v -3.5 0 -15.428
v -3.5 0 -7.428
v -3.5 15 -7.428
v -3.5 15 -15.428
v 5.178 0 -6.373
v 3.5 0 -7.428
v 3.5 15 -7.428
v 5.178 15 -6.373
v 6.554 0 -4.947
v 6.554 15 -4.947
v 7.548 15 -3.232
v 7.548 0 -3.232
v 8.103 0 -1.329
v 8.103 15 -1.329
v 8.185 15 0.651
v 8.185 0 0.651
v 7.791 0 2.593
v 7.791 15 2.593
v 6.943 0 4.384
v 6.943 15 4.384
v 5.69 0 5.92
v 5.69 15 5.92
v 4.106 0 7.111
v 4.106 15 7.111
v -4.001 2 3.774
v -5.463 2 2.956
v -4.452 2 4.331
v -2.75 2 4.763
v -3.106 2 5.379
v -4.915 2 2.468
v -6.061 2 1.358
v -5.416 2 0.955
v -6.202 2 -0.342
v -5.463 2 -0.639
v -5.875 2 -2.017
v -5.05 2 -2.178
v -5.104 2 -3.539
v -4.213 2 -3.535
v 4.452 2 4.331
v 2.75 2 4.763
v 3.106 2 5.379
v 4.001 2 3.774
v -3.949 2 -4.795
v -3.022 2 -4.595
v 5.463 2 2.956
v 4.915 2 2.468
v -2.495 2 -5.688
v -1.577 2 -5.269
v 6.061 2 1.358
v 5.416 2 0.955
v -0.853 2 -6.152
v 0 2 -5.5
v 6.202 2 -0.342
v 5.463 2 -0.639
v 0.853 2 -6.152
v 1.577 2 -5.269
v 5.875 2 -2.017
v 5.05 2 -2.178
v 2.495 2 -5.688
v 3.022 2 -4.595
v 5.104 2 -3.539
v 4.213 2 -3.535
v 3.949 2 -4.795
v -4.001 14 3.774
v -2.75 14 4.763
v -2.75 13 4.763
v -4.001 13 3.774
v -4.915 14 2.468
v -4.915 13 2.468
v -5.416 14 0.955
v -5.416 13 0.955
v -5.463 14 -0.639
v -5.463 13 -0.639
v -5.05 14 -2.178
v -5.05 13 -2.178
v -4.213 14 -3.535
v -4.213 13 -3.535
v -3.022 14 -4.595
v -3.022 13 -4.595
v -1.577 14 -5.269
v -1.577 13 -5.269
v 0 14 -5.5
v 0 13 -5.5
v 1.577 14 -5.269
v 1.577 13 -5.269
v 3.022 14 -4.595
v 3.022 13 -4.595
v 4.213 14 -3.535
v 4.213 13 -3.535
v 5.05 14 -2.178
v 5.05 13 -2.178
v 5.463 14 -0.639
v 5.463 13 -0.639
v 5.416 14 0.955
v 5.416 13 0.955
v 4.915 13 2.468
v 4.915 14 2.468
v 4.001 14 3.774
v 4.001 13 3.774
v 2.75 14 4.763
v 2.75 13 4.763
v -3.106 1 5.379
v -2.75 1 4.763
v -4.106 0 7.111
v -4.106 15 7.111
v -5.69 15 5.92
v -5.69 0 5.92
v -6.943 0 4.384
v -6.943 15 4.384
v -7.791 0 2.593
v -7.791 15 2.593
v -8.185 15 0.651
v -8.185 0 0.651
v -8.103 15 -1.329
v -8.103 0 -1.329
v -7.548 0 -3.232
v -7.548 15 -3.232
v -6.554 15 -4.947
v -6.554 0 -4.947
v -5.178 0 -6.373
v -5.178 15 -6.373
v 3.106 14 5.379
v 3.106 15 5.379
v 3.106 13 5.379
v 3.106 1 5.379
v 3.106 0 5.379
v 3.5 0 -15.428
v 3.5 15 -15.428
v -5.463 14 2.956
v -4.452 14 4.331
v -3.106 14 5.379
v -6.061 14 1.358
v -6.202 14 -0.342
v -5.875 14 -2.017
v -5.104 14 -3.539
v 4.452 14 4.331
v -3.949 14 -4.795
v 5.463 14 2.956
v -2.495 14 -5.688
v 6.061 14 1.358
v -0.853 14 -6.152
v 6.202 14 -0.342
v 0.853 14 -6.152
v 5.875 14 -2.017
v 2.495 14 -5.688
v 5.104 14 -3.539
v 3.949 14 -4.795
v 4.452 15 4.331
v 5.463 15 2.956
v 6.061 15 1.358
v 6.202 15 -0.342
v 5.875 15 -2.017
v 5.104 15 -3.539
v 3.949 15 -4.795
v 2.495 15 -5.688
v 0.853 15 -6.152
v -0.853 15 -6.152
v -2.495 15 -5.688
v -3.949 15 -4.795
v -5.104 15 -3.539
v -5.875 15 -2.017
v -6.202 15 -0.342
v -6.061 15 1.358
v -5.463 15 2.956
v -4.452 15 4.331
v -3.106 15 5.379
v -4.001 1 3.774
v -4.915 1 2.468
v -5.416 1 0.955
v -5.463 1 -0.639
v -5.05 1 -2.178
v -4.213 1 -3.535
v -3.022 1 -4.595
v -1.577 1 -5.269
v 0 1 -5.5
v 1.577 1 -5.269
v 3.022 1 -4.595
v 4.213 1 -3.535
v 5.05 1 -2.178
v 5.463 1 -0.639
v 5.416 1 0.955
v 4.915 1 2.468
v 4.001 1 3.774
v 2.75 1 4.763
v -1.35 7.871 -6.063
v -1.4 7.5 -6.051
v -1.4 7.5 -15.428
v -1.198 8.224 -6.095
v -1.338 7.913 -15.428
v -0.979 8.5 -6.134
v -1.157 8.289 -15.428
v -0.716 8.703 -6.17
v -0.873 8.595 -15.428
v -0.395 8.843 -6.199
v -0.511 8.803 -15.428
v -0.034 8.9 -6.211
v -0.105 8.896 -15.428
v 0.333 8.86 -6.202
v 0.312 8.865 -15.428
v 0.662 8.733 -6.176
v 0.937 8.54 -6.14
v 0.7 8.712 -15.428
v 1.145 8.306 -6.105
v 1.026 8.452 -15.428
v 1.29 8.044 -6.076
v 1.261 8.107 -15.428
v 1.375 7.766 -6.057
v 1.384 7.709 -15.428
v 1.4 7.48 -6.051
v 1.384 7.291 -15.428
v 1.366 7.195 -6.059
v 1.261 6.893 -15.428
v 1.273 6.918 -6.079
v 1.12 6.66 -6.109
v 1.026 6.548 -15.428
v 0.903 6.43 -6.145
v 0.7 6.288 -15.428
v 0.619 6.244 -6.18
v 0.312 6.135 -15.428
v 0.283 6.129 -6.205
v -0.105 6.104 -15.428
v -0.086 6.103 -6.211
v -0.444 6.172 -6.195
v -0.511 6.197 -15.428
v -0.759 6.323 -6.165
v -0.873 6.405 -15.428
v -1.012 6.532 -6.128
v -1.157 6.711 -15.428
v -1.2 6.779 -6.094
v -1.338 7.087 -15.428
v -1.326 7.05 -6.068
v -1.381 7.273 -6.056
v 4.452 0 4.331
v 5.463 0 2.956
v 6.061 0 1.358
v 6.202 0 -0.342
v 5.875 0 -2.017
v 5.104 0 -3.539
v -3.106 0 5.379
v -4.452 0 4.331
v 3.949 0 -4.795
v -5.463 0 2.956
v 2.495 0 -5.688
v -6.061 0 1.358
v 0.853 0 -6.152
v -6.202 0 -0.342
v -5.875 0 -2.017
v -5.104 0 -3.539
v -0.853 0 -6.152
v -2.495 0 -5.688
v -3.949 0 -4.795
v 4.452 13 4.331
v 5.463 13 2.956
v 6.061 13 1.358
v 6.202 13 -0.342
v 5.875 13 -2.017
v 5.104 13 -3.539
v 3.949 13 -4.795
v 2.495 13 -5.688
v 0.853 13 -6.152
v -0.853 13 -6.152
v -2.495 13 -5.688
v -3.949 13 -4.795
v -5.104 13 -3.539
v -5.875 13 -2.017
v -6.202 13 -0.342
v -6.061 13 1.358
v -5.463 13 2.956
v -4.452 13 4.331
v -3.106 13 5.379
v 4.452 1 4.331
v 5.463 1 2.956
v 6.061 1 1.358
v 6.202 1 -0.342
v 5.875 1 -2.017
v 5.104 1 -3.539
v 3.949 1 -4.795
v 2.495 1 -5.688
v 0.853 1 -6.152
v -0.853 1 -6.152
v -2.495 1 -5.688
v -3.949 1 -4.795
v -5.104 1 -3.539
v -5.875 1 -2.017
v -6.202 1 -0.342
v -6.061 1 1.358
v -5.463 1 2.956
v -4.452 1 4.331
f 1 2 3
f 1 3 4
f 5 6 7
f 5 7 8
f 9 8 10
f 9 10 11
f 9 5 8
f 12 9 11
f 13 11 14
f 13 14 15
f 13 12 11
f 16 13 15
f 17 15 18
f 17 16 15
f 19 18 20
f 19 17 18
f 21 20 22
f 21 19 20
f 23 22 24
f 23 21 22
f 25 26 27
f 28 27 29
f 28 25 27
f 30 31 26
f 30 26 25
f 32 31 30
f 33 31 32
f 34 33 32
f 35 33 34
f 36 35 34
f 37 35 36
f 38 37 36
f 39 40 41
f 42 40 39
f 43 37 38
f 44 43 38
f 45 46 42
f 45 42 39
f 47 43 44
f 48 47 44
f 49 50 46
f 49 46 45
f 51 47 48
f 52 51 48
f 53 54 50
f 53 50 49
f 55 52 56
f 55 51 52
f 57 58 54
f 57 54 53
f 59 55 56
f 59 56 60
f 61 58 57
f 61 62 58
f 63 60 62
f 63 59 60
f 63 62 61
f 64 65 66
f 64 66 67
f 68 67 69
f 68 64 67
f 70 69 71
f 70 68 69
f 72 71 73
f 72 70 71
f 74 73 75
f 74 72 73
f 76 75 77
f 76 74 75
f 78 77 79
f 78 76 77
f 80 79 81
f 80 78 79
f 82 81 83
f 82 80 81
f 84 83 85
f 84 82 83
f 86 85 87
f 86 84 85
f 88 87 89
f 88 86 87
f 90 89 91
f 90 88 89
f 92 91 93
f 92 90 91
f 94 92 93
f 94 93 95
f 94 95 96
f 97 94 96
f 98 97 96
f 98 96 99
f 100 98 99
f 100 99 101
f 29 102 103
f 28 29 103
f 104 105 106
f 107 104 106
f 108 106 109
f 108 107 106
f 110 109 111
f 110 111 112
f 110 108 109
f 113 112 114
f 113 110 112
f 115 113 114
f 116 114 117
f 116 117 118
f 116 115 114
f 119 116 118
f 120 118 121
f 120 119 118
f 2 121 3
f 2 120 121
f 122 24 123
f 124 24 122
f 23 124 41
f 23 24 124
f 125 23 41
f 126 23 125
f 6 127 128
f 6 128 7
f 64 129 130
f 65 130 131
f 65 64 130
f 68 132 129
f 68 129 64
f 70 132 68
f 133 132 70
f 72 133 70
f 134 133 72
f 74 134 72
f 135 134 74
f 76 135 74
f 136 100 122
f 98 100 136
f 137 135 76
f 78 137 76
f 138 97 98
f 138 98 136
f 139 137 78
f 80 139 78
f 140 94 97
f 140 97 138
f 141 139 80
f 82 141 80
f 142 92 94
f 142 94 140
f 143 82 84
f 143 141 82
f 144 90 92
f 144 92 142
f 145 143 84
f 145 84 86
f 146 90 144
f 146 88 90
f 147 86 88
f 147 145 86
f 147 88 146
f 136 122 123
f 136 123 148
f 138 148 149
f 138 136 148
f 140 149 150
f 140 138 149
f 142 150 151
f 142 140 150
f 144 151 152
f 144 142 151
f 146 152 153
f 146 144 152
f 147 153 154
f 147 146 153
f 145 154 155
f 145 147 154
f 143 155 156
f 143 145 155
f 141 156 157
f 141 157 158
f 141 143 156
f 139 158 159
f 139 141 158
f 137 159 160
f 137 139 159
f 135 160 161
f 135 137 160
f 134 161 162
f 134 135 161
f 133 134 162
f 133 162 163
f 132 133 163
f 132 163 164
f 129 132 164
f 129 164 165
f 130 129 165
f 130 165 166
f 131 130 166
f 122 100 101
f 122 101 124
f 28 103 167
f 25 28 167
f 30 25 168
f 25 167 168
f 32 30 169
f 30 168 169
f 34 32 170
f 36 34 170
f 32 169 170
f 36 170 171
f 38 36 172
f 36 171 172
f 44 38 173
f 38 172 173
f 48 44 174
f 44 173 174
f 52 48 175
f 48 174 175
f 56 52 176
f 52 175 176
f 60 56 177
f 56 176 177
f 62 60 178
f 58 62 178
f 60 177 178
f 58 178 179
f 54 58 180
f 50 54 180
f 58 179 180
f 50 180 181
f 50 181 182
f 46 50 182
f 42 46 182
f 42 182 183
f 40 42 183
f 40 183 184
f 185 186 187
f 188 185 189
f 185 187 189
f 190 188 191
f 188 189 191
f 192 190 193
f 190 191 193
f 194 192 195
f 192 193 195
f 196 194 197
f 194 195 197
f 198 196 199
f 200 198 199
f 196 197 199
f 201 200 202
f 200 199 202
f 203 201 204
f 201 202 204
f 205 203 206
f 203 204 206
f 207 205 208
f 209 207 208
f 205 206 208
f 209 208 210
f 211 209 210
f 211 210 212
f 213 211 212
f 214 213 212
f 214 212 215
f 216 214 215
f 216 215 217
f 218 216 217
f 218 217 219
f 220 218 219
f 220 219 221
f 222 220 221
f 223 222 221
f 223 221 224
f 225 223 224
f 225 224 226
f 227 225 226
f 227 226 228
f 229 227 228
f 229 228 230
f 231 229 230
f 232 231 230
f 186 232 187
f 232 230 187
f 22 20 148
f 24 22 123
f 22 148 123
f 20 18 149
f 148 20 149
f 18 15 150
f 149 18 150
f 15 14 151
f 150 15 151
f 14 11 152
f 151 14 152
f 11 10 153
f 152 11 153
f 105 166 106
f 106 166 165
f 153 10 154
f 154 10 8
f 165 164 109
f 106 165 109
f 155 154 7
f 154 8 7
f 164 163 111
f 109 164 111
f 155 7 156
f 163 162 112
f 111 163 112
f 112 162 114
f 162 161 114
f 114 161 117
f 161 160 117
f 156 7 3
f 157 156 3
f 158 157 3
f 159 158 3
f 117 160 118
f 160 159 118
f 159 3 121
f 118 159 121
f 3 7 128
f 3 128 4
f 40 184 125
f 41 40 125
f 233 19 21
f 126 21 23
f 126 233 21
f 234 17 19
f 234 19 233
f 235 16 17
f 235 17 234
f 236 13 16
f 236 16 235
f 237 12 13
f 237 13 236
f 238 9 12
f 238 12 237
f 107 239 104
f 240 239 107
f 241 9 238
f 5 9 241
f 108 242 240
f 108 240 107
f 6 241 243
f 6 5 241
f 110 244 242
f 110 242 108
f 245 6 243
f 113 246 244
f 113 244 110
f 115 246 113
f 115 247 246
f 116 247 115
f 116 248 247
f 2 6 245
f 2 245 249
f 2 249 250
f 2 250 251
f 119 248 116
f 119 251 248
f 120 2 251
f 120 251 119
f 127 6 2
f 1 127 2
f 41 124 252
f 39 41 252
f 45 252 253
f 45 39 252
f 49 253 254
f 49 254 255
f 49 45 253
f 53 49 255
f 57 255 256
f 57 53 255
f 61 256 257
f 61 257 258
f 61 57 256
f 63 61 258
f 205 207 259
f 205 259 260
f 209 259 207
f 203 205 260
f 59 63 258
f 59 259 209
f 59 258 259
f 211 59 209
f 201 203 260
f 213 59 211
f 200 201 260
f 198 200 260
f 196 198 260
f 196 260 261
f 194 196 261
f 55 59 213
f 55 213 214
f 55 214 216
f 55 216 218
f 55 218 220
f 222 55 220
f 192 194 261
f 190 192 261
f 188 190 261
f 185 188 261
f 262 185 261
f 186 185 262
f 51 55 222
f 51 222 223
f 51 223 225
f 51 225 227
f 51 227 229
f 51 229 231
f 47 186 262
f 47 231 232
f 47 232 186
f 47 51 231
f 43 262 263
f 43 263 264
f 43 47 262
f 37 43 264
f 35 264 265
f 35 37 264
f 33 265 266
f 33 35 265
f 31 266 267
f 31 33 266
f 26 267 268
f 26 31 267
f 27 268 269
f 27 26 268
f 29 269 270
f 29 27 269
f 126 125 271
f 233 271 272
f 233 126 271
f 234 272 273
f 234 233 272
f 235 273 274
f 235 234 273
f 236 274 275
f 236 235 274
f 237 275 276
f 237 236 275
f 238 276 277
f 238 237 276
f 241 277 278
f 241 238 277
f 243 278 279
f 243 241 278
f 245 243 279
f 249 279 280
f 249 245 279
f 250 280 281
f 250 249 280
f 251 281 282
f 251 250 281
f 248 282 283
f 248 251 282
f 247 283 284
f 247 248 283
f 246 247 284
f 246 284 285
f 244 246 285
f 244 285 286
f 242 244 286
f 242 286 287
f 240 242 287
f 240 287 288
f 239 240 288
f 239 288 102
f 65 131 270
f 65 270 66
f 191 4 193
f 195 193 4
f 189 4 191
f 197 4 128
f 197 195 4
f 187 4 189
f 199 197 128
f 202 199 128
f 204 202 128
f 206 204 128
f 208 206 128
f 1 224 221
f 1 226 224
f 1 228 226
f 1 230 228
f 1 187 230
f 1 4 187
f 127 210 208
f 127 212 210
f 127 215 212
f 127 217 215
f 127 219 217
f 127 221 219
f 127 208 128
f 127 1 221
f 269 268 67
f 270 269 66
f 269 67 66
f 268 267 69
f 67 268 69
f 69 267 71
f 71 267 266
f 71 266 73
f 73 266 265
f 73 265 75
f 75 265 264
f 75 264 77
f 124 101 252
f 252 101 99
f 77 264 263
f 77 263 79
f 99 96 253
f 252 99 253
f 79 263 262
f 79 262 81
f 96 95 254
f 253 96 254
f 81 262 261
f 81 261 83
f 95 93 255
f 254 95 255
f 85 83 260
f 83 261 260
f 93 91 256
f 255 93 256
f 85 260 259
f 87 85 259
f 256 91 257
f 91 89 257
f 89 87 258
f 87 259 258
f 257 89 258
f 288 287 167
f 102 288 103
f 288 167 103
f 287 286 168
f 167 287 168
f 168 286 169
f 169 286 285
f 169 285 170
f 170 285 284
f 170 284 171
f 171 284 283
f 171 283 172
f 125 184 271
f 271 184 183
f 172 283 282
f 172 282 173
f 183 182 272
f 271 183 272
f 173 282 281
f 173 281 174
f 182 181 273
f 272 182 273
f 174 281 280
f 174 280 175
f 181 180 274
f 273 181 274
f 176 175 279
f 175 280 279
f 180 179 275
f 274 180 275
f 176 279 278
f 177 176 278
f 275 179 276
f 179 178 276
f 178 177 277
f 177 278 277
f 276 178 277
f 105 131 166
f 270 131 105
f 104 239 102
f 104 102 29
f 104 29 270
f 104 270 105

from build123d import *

# Parameters (mm, degrees)
SKETCH1_R               = 6.211279156
BOSS_EXTRUDE1_DEPTH     = 15
CUT_EXTRUDE1_DEPTH      = 24.031459486
CUT_EXTRUDE1_DEPTH_BACK = 24.031459486
BOSS_EXTRUDE3_DEPTH     = 1
SKETCH6_R               = 1.4
CUT_EXTRUDE2_DEPTH      = 10


with BuildPart() as part:
    # Sketch1 → Boss-Extrude1 (new body)
    with BuildSketch(Plane(origin=(0, 0, 0), x_dir=(1, 0, 0), z_dir=(0, 1, 0))):
        with BuildLine():
            Line((-3.5, 7.427994707), (-3.5, 15.427994707))
            Line((-3.5, 15.427994707), (3.5, 15.427994707))
            Line((3.5, 15.427994707), (3.5, 7.427994707))
            ThreePointArc((3.5, 7.427994707), (0, -8.211279156), (-3.5, 7.427994707))
        make_face()
        with Locations(Location((0, 0, 0), (0, 0, 270))):
            Circle(SKETCH1_R, mode=Mode.SUBTRACT)
    extrude(amount=BOSS_EXTRUDE1_DEPTH)

    # Sketch4 → Cut-Extrude1 (cut, two sides: drawn at the far end of the back side and taken through both)
    with BuildSketch(Plane(origin=(0, 15, 0), x_dir=(1, 0, 0), z_dir=(0, 1, 0)).offset(-CUT_EXTRUDE1_DEPTH_BACK)):
        with BuildLine():
            Line((-3.105639578, -5.379125539), (-4.105639578, -7.111176346))
            ThreePointArc((-4.105639578, -7.111176346), (0, -8.211279156), (4.105639578, -7.111176346))
            Line((4.105639578, -7.111176346), (3.105639578, -5.379125539))
            ThreePointArc((3.105639578, -5.379125539), (0, -6.211279156), (-3.105639578, -5.379125539))
        make_face()
    extrude(amount=CUT_EXTRUDE1_DEPTH + CUT_EXTRUDE1_DEPTH_BACK, mode=Mode.SUBTRACT)

    # Sketch5 → Boss-Extrude3 (add)
    with BuildSketch(Plane(origin=(0, 1, 0), x_dir=(-1, 0, 0), z_dir=(0, -1, 0))):
        with BuildLine():
            Line((3.105639578, -5.379125539), (2.749999992, -4.763139708))
            ThreePointArc((2.749999992, -4.763139708), (0, 5.499999985), (-2.749999992, -4.763139708))
            Line((-2.749999992, -4.763139708), (-3.105639578, -5.379125539))
            ThreePointArc((-3.105639578, -5.379125539), (0, 6.211279156), (3.105639578, -5.379125539))
        make_face()
    boss_extrude3 = extrude(amount=-BOSS_EXTRUDE3_DEPTH)

    # Mirror1: Boss-Extrude3 across plane
    add(boss_extrude3.mirror(Plane.ZX.offset(7.5)))

    # Sketch6 → Cut-Extrude2 (cut)
    with BuildSketch(Plane(origin=(0, 0, -15.427994707), x_dir=(-1, 0, 0), z_dir=(0, 0, -1))):
        with Locations((0, 7.5)):
            Circle(SKETCH6_R)
    extrude(amount=-CUT_EXTRUDE2_DEPTH, mode=Mode.SUBTRACT)


solid = part.part
